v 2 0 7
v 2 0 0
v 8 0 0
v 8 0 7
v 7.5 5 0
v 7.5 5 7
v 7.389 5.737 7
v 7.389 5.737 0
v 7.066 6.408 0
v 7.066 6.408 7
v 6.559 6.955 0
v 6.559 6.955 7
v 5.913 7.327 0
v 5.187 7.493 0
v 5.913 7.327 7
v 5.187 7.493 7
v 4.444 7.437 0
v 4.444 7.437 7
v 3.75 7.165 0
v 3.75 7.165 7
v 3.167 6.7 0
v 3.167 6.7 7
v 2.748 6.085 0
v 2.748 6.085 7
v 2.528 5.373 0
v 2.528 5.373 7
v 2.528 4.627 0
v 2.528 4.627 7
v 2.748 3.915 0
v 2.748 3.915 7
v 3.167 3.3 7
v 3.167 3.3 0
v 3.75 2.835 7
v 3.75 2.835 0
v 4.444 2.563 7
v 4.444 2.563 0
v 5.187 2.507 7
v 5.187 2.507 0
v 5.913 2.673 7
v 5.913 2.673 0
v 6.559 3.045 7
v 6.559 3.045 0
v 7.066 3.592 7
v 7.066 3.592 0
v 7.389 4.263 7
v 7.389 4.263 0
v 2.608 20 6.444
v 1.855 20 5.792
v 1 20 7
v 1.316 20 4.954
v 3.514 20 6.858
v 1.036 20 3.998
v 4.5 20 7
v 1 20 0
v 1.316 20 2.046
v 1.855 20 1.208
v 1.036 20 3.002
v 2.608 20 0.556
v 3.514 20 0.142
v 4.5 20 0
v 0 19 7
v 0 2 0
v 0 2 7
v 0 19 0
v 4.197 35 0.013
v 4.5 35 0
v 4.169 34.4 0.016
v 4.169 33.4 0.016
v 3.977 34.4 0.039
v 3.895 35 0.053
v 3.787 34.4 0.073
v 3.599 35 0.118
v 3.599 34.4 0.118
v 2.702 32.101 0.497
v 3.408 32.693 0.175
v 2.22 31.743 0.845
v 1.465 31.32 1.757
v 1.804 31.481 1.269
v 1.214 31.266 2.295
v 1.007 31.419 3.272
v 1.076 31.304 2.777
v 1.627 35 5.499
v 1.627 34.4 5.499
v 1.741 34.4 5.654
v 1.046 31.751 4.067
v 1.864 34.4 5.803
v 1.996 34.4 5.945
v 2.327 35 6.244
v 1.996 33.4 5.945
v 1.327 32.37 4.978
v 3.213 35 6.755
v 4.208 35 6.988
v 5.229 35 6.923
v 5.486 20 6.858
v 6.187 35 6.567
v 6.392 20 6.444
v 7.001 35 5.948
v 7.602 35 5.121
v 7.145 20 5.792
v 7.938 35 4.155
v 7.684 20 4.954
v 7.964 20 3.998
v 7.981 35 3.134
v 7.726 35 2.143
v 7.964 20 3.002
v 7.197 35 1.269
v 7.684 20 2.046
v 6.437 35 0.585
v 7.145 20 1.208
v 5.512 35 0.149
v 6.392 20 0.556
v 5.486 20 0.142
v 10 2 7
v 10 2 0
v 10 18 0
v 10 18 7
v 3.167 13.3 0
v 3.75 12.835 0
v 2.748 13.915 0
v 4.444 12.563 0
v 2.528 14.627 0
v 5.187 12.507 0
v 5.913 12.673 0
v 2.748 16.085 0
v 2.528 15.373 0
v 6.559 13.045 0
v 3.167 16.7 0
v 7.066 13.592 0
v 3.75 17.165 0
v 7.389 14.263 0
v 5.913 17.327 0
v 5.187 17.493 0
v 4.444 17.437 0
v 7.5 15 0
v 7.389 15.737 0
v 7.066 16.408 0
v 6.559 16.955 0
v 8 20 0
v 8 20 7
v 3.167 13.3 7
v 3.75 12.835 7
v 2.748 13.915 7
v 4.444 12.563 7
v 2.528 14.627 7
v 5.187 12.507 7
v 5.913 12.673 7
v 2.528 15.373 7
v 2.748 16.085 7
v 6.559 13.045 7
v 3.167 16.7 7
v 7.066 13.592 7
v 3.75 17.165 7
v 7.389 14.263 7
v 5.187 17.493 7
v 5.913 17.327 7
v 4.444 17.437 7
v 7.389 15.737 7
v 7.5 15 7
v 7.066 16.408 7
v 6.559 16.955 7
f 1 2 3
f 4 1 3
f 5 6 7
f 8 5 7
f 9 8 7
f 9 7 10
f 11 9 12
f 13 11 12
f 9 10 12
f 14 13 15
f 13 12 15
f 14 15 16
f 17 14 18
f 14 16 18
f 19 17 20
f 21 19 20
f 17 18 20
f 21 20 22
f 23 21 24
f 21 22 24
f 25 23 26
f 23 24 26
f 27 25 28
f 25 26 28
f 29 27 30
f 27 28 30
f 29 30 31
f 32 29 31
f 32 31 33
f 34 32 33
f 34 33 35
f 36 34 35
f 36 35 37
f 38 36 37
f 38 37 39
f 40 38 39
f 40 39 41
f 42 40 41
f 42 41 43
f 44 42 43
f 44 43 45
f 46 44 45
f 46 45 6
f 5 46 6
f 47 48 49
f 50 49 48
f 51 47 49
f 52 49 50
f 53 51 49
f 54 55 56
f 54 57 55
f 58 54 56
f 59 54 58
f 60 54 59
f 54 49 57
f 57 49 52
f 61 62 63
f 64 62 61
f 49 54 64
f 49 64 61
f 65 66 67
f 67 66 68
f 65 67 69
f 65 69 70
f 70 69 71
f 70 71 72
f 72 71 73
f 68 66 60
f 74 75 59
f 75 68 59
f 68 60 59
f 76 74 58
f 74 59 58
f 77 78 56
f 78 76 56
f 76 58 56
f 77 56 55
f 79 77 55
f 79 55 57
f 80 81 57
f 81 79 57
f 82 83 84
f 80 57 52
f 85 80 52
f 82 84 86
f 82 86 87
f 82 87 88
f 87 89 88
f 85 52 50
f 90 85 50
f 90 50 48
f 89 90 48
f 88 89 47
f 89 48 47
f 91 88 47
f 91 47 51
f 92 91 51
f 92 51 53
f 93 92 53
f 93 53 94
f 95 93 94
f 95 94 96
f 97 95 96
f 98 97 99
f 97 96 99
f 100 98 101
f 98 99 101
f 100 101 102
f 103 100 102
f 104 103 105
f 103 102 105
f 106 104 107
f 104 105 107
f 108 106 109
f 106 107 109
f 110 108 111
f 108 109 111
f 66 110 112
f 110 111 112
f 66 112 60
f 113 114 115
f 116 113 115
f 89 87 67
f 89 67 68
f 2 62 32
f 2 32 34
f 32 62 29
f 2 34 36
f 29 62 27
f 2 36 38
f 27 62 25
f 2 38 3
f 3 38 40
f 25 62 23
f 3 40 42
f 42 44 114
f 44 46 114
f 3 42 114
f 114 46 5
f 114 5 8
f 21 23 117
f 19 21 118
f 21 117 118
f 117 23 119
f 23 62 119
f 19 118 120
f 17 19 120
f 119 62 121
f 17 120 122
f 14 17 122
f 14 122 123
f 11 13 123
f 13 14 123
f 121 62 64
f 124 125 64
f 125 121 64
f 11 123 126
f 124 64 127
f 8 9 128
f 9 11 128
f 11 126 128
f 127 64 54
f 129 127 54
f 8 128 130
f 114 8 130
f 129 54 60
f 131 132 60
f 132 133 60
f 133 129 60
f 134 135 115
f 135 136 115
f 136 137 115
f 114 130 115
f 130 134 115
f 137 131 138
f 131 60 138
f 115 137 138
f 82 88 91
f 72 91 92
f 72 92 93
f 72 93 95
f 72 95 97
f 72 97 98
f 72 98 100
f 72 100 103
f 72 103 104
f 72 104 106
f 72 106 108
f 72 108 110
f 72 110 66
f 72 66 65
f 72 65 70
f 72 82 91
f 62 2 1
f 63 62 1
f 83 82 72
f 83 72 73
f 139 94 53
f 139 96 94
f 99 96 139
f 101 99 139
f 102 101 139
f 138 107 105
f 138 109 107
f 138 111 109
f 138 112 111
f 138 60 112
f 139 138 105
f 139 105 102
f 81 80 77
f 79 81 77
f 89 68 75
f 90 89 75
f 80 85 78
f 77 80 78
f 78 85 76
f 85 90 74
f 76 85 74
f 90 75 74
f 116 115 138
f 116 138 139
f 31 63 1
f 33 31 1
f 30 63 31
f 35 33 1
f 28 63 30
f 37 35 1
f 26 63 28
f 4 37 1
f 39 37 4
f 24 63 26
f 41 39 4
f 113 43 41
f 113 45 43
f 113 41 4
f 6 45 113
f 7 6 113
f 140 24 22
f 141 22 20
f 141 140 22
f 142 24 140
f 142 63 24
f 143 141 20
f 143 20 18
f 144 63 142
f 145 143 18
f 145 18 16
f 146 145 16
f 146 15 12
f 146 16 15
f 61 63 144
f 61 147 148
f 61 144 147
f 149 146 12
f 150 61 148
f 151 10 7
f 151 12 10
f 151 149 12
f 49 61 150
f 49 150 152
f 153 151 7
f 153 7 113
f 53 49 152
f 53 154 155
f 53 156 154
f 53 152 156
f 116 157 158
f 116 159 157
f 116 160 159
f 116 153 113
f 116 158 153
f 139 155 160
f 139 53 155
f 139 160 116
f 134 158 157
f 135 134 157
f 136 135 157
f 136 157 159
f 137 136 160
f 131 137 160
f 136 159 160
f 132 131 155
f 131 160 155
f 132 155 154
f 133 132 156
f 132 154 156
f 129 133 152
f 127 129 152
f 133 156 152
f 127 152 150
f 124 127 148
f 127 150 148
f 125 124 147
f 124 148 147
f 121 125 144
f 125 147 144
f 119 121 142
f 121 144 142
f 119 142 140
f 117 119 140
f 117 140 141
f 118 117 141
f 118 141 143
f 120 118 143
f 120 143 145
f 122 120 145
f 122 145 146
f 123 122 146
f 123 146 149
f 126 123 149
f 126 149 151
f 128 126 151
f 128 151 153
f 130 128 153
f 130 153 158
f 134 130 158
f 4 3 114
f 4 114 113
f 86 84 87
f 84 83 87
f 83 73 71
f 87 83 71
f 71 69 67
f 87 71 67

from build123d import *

# Parameters (mm, degrees)
SKETCH1_W               = 10
SKETCH1_H               = 20
BOSS_EXTRUDE1_DEPTH     = 7
SKETCH2_R               = 3.5
BOSS_EXTRUDE2_DEPTH     = 15
SKETCH3_R               = 2.5
CUT_EXTRUDE1_DEPTH      = 38.067505986
CUT_EXTRUDE2_DEPTH      = 37.961317978
CUT_EXTRUDE2_DEPTH_BACK = 37.961317978
CHAMFER1_SIZE           = 2
CHAMFER2_SIZE           = 1


with BuildPart() as part:
    # Sketch1 → Boss-Extrude1 (new body)
    with BuildSketch(Plane.XY):
        with Locations((5, 10)):
            Rectangle(SKETCH1_W, SKETCH1_H)
    extrude(amount=BOSS_EXTRUDE1_DEPTH)

    # Sketch2 → Boss-Extrude2 (add)
    with BuildSketch(Plane(origin=(0, 20, 0), x_dir=(1, 0, 0), z_dir=(0, 1, 0))):
        with Locations(Location((4.5, -3.5, 0), (0, 0, 90))):
            Circle(SKETCH2_R)
    extrude(amount=BOSS_EXTRUDE2_DEPTH)

    # Sketch3 → Cut-Extrude1 (cut, through all)
    with BuildSketch(Plane.XY.offset(7)):
        with Locations((5, 15)):
            Circle(SKETCH3_R)
        with Locations((5, 5)):
            Circle(SKETCH3_R)
    extrude(amount=-CUT_EXTRUDE1_DEPTH, mode=Mode.SUBTRACT)

    # Sketch4 → Cut-Extrude2 (cut, two sides: drawn at the far end of the back side and taken through both)
    with BuildSketch(Plane(origin=(-0.597969362, 0, 1.631380802), x_dir=(0.9389141835786157, 0, 0.34415135605559033), z_dir=(-0.34415135605559033, 0, 0.9389141835786157)).offset(-CUT_EXTRUDE2_DEPTH_BACK)):
        Polygon((1.929643572, 35), (3.419643572, 35), (3.419643572, 34.4), (3.919643572, 34.4), (3.919643572, 33.4), (1.929643572, 31.265986267), align=None)
    extrude(amount=CUT_EXTRUDE2_DEPTH + CUT_EXTRUDE2_DEPTH_BACK, mode=Mode.SUBTRACT)

    # Chamfer1
    chamfer1_edges = [part.edges().sort_by_distance(p)[0] for p in [
        (10, 20, 3.5),
        (10, 0, 3.5),
        (0, 0, 3.5),
    ]]
    chamfer(chamfer1_edges, length=CHAMFER1_SIZE - 0.0001)  # a hair under: the kernel refuses the full size

    # Chamfer2
    chamfer2_edges = [part.edges().sort_by_distance(p)[0] for p in [
        (0, 20, 3.5),
    ]]
    chamfer(chamfer2_edges, length=CHAMFER2_SIZE - 0.0001)  # a hair under: the kernel refuses the full size


solid = part.part
